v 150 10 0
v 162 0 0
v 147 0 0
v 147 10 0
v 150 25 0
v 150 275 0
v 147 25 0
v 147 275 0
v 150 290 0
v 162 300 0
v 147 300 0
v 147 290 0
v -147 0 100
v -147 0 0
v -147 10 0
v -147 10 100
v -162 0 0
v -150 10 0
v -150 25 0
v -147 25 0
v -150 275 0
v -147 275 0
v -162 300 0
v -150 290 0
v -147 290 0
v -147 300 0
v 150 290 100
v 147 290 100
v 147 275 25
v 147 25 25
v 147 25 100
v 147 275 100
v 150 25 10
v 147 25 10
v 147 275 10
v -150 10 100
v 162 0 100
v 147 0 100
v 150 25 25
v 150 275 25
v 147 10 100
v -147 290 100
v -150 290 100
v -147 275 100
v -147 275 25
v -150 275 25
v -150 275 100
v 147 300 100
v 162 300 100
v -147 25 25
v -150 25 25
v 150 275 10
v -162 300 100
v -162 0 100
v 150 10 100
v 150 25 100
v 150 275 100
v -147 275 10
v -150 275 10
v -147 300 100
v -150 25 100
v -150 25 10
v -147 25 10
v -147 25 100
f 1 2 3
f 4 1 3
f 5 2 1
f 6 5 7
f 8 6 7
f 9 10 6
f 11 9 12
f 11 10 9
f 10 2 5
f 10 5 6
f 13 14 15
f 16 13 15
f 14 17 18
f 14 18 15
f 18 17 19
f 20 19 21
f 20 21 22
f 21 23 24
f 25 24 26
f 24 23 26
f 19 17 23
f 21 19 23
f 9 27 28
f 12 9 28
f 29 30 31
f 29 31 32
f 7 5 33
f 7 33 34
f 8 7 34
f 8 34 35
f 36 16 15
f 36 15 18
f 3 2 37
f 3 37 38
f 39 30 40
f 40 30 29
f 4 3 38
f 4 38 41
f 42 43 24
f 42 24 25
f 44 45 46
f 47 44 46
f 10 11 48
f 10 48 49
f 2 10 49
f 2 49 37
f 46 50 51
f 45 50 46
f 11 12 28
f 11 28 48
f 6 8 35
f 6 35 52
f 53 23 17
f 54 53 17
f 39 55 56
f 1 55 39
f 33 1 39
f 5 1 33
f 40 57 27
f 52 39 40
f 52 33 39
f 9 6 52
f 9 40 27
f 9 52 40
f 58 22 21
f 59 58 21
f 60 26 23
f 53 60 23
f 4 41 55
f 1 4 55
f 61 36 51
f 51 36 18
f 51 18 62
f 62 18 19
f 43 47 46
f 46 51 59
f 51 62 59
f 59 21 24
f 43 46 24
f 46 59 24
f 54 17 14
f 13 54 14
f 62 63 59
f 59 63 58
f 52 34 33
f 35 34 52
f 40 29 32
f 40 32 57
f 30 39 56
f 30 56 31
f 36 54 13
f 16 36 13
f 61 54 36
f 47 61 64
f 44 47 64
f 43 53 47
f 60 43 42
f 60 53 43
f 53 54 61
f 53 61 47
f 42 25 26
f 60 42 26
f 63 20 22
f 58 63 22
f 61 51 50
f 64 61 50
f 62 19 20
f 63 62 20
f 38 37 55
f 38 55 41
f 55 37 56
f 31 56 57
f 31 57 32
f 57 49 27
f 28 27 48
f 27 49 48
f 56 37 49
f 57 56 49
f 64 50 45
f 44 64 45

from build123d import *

# Parameters (mm, degrees)
F1_DEPTH = 100
F2_W     = 250
F2_H     = 15
F3_DEPTH = 3


with BuildPart() as f1:
    # F0 (on Top) → F1 (new body)
    with BuildSketch(Plane.XY):
        Polygon((-162, 300), (-162, 0), (-147, 0), (-147, 10), (-150, 10), (-150, 25), (-147, 25), (-147, 275), (-150, 275), (-150, 290), (-147, 290), (-147, 300), align=None)
    extrude(amount=F1_DEPTH)

    # F2 (on face) → F3 (cut, through all)
    with BuildSketch(Plane.YZ.offset(-147)):
        with Locations((150, 17.5)):
            Rectangle(F2_W, F2_H)
    extrude(amount=-F3_DEPTH, mode=Mode.SUBTRACT)


with BuildPart() as f4_1:
    # F4: instance of F1
    add(f1.part.mirror(Plane.YZ))


solid = Compound([f1.part, f4_1.part])
